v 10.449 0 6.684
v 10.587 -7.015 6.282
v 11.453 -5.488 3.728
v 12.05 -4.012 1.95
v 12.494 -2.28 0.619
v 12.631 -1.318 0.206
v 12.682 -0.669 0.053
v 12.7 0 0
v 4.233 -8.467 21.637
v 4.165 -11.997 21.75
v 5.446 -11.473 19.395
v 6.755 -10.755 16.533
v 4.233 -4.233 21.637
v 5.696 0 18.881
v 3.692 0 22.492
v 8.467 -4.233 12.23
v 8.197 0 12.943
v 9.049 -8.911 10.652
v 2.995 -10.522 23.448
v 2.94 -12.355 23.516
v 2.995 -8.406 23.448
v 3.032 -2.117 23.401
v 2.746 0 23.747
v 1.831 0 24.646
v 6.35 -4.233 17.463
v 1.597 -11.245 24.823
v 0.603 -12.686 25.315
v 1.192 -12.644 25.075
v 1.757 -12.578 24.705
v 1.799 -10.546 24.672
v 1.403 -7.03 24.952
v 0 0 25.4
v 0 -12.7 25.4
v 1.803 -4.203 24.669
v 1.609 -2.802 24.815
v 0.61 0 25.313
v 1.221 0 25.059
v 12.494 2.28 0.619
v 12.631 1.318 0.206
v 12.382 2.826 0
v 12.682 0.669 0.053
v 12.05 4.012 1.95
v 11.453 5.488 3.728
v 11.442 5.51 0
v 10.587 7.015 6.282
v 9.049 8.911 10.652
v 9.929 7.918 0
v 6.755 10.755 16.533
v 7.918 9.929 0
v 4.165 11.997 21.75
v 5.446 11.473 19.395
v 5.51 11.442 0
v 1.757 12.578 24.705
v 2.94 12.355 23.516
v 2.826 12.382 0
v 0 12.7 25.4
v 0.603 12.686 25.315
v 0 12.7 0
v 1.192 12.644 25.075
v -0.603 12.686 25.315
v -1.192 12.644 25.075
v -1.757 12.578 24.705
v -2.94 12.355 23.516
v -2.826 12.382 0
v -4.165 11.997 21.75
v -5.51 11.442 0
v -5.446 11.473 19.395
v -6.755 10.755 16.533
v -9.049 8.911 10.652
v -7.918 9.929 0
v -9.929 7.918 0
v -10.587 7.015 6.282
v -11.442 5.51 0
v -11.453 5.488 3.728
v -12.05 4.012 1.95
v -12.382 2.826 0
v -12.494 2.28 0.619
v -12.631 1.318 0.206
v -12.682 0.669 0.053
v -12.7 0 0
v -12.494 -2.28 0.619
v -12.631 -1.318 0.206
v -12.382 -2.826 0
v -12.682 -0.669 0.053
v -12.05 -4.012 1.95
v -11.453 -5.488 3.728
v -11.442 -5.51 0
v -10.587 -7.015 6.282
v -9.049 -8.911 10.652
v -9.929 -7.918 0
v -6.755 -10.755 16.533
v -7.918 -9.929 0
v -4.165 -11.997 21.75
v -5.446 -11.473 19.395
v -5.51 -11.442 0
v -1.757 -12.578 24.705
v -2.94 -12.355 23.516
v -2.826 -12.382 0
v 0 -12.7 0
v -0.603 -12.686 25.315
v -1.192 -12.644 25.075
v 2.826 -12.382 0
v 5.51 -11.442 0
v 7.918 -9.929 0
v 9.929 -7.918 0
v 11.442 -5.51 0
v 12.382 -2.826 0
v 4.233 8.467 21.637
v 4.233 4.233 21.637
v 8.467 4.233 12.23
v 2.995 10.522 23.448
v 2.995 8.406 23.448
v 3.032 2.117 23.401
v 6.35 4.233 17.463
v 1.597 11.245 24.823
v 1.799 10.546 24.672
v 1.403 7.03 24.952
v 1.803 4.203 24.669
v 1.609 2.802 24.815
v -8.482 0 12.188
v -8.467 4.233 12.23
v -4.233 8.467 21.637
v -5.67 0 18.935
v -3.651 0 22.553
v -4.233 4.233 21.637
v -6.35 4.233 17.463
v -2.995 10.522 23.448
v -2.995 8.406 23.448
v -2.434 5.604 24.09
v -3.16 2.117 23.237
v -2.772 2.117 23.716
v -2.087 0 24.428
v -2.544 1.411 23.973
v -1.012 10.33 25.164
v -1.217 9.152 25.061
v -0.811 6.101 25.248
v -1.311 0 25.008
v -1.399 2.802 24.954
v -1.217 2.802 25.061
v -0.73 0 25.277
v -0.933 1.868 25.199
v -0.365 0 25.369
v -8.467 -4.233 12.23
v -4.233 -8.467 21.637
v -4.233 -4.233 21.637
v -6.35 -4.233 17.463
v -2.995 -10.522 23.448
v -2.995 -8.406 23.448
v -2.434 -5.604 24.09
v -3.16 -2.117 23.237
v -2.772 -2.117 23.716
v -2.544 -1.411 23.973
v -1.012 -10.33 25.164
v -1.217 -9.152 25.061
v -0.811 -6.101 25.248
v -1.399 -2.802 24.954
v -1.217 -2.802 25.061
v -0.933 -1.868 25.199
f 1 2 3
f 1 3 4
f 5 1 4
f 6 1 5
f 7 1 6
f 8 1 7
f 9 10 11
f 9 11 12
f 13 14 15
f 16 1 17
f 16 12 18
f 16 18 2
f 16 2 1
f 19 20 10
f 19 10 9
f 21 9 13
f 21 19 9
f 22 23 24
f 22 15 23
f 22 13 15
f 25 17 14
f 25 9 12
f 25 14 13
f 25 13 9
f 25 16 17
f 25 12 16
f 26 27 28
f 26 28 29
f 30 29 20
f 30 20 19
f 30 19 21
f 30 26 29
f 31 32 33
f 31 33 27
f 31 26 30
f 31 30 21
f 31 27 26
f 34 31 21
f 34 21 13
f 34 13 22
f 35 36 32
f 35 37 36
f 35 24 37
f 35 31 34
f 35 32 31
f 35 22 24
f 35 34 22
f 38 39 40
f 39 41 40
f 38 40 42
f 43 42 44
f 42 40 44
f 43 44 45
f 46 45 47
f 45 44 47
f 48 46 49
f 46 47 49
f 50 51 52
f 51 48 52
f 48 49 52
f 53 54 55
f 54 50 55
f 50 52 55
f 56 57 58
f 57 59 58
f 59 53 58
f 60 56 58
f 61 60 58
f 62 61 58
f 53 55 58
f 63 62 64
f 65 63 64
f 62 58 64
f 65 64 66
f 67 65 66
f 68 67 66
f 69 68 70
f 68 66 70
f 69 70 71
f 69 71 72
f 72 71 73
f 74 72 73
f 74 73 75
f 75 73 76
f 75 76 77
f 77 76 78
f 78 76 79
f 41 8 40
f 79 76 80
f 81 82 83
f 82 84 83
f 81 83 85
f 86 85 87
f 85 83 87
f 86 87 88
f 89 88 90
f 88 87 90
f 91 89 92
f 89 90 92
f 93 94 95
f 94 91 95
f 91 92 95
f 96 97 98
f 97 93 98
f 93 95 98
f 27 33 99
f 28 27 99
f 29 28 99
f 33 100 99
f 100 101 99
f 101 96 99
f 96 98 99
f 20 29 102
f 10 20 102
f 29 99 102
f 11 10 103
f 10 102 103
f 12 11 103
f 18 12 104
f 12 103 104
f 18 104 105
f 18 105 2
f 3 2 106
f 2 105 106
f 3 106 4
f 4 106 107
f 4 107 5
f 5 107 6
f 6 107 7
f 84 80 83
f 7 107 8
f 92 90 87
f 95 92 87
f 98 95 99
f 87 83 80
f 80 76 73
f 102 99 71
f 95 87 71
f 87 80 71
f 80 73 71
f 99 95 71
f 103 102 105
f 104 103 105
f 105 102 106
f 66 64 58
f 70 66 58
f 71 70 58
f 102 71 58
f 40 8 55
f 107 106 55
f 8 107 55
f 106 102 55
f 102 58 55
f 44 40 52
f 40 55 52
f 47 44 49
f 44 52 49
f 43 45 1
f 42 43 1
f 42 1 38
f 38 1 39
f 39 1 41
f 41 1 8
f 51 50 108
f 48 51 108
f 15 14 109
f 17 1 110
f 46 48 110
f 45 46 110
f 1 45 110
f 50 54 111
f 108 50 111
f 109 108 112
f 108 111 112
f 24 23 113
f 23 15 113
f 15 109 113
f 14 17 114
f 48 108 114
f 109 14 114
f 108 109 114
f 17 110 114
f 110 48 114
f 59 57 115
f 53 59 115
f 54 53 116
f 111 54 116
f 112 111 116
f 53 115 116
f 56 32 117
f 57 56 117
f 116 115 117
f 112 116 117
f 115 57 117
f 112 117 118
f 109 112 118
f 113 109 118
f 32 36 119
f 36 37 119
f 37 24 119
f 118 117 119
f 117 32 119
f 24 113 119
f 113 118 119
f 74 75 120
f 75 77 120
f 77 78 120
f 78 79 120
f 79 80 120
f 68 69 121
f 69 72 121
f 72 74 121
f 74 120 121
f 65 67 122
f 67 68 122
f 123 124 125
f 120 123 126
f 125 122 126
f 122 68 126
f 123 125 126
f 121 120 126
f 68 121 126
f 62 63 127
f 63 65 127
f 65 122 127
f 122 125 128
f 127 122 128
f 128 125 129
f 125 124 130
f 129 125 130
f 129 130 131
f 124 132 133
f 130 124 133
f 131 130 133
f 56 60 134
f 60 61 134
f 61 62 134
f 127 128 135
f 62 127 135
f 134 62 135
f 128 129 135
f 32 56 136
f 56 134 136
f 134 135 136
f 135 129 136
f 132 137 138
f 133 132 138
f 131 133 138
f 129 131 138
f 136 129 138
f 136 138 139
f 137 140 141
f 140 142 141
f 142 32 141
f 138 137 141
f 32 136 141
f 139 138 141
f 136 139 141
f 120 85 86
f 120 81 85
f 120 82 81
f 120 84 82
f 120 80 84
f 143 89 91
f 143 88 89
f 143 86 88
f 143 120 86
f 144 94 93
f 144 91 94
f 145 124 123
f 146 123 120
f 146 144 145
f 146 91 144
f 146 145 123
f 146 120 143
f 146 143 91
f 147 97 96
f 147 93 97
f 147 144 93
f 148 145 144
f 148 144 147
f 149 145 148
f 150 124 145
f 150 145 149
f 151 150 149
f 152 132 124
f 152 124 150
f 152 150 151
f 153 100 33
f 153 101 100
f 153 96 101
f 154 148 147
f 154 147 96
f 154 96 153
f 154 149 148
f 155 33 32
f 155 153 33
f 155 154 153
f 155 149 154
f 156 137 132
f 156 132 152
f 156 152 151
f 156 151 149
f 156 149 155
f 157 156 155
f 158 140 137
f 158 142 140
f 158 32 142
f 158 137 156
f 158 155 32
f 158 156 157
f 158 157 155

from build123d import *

# Parameters (mm, degrees)
F0_R     = 12.7
F1_DEPTH = 25.4
F3_DEPTH = 25.4
F6_DEPTH = 76.2


with BuildPart() as f1:
    # F0 (on Top) → F1 (new body)
    with BuildSketch(Plane.XY):
        Circle(F0_R)
    extrude(amount=F1_DEPTH)

    # F2 (on Front) → F3 (cut, symmetric)
    with BuildSketch(Plane.XZ):
        with BuildLine():
            Line((-12.7, 25.4), (-12.7, 0))
            add(Edge.make_bspline(
                [(-12.7, 0), (-8.466667, 12.7), (-4.233333, 25.4), (0, 25.4)],
                knots=[0, 0, 0, 0, 28.398063, 28.398063, 28.398063, 28.398063], degree=3))
            Line((0, 25.4), (-12.7, 25.4))
        make_face()
        with BuildLine():
            Line((12.7, 25.4), (0, 25.4))
            add(Edge.make_bspline(
                [(0, 25.4), (4.233333, 25.4), (8.466667, 12.7), (12.7, 0)],
                knots=[28.398063, 28.398063, 28.398063, 28.398063, 56.796127, 56.796127, 56.796127, 56.796127], degree=3))
            Line((12.7, 0), (12.7, 25.4))
        make_face()
    extrude(amount=F3_DEPTH, both=True, mode=Mode.SUBTRACT)

    # F5 (on offset) → F6 (cut)
    with BuildSketch(Plane.XZ.offset(25.4)):
        with BuildLine():
            add(Edge.make_bspline(
                [(0, 25.4), (4.233333, 25.4), (8.466667, 12.7), (12.7, 0)],
                knots=[28.398063, 28.398063, 28.398063, 28.398063, 56.796127, 56.796127, 56.796127, 56.796127], degree=3))
            Line((12.7, 0), (12.7, 25.4))
            Line((12.7, 25.4), (0, 25.4))
        make_face()
        with BuildLine():
            Line((-12.7, 25.4), (-12.7, 0))
            add(Edge.make_bspline(
                [(-12.7, 0), (-8.466667, 12.7), (-4.233333, 25.4), (0, 25.4)],
                knots=[0, 0, 0, 0, 28.398063, 28.398063, 28.398063, 28.398063], degree=3))
            Line((0, 25.4), (-12.7, 25.4))
        make_face()
    extrude(amount=-F6_DEPTH, mode=Mode.SUBTRACT)


solid = f1.part
